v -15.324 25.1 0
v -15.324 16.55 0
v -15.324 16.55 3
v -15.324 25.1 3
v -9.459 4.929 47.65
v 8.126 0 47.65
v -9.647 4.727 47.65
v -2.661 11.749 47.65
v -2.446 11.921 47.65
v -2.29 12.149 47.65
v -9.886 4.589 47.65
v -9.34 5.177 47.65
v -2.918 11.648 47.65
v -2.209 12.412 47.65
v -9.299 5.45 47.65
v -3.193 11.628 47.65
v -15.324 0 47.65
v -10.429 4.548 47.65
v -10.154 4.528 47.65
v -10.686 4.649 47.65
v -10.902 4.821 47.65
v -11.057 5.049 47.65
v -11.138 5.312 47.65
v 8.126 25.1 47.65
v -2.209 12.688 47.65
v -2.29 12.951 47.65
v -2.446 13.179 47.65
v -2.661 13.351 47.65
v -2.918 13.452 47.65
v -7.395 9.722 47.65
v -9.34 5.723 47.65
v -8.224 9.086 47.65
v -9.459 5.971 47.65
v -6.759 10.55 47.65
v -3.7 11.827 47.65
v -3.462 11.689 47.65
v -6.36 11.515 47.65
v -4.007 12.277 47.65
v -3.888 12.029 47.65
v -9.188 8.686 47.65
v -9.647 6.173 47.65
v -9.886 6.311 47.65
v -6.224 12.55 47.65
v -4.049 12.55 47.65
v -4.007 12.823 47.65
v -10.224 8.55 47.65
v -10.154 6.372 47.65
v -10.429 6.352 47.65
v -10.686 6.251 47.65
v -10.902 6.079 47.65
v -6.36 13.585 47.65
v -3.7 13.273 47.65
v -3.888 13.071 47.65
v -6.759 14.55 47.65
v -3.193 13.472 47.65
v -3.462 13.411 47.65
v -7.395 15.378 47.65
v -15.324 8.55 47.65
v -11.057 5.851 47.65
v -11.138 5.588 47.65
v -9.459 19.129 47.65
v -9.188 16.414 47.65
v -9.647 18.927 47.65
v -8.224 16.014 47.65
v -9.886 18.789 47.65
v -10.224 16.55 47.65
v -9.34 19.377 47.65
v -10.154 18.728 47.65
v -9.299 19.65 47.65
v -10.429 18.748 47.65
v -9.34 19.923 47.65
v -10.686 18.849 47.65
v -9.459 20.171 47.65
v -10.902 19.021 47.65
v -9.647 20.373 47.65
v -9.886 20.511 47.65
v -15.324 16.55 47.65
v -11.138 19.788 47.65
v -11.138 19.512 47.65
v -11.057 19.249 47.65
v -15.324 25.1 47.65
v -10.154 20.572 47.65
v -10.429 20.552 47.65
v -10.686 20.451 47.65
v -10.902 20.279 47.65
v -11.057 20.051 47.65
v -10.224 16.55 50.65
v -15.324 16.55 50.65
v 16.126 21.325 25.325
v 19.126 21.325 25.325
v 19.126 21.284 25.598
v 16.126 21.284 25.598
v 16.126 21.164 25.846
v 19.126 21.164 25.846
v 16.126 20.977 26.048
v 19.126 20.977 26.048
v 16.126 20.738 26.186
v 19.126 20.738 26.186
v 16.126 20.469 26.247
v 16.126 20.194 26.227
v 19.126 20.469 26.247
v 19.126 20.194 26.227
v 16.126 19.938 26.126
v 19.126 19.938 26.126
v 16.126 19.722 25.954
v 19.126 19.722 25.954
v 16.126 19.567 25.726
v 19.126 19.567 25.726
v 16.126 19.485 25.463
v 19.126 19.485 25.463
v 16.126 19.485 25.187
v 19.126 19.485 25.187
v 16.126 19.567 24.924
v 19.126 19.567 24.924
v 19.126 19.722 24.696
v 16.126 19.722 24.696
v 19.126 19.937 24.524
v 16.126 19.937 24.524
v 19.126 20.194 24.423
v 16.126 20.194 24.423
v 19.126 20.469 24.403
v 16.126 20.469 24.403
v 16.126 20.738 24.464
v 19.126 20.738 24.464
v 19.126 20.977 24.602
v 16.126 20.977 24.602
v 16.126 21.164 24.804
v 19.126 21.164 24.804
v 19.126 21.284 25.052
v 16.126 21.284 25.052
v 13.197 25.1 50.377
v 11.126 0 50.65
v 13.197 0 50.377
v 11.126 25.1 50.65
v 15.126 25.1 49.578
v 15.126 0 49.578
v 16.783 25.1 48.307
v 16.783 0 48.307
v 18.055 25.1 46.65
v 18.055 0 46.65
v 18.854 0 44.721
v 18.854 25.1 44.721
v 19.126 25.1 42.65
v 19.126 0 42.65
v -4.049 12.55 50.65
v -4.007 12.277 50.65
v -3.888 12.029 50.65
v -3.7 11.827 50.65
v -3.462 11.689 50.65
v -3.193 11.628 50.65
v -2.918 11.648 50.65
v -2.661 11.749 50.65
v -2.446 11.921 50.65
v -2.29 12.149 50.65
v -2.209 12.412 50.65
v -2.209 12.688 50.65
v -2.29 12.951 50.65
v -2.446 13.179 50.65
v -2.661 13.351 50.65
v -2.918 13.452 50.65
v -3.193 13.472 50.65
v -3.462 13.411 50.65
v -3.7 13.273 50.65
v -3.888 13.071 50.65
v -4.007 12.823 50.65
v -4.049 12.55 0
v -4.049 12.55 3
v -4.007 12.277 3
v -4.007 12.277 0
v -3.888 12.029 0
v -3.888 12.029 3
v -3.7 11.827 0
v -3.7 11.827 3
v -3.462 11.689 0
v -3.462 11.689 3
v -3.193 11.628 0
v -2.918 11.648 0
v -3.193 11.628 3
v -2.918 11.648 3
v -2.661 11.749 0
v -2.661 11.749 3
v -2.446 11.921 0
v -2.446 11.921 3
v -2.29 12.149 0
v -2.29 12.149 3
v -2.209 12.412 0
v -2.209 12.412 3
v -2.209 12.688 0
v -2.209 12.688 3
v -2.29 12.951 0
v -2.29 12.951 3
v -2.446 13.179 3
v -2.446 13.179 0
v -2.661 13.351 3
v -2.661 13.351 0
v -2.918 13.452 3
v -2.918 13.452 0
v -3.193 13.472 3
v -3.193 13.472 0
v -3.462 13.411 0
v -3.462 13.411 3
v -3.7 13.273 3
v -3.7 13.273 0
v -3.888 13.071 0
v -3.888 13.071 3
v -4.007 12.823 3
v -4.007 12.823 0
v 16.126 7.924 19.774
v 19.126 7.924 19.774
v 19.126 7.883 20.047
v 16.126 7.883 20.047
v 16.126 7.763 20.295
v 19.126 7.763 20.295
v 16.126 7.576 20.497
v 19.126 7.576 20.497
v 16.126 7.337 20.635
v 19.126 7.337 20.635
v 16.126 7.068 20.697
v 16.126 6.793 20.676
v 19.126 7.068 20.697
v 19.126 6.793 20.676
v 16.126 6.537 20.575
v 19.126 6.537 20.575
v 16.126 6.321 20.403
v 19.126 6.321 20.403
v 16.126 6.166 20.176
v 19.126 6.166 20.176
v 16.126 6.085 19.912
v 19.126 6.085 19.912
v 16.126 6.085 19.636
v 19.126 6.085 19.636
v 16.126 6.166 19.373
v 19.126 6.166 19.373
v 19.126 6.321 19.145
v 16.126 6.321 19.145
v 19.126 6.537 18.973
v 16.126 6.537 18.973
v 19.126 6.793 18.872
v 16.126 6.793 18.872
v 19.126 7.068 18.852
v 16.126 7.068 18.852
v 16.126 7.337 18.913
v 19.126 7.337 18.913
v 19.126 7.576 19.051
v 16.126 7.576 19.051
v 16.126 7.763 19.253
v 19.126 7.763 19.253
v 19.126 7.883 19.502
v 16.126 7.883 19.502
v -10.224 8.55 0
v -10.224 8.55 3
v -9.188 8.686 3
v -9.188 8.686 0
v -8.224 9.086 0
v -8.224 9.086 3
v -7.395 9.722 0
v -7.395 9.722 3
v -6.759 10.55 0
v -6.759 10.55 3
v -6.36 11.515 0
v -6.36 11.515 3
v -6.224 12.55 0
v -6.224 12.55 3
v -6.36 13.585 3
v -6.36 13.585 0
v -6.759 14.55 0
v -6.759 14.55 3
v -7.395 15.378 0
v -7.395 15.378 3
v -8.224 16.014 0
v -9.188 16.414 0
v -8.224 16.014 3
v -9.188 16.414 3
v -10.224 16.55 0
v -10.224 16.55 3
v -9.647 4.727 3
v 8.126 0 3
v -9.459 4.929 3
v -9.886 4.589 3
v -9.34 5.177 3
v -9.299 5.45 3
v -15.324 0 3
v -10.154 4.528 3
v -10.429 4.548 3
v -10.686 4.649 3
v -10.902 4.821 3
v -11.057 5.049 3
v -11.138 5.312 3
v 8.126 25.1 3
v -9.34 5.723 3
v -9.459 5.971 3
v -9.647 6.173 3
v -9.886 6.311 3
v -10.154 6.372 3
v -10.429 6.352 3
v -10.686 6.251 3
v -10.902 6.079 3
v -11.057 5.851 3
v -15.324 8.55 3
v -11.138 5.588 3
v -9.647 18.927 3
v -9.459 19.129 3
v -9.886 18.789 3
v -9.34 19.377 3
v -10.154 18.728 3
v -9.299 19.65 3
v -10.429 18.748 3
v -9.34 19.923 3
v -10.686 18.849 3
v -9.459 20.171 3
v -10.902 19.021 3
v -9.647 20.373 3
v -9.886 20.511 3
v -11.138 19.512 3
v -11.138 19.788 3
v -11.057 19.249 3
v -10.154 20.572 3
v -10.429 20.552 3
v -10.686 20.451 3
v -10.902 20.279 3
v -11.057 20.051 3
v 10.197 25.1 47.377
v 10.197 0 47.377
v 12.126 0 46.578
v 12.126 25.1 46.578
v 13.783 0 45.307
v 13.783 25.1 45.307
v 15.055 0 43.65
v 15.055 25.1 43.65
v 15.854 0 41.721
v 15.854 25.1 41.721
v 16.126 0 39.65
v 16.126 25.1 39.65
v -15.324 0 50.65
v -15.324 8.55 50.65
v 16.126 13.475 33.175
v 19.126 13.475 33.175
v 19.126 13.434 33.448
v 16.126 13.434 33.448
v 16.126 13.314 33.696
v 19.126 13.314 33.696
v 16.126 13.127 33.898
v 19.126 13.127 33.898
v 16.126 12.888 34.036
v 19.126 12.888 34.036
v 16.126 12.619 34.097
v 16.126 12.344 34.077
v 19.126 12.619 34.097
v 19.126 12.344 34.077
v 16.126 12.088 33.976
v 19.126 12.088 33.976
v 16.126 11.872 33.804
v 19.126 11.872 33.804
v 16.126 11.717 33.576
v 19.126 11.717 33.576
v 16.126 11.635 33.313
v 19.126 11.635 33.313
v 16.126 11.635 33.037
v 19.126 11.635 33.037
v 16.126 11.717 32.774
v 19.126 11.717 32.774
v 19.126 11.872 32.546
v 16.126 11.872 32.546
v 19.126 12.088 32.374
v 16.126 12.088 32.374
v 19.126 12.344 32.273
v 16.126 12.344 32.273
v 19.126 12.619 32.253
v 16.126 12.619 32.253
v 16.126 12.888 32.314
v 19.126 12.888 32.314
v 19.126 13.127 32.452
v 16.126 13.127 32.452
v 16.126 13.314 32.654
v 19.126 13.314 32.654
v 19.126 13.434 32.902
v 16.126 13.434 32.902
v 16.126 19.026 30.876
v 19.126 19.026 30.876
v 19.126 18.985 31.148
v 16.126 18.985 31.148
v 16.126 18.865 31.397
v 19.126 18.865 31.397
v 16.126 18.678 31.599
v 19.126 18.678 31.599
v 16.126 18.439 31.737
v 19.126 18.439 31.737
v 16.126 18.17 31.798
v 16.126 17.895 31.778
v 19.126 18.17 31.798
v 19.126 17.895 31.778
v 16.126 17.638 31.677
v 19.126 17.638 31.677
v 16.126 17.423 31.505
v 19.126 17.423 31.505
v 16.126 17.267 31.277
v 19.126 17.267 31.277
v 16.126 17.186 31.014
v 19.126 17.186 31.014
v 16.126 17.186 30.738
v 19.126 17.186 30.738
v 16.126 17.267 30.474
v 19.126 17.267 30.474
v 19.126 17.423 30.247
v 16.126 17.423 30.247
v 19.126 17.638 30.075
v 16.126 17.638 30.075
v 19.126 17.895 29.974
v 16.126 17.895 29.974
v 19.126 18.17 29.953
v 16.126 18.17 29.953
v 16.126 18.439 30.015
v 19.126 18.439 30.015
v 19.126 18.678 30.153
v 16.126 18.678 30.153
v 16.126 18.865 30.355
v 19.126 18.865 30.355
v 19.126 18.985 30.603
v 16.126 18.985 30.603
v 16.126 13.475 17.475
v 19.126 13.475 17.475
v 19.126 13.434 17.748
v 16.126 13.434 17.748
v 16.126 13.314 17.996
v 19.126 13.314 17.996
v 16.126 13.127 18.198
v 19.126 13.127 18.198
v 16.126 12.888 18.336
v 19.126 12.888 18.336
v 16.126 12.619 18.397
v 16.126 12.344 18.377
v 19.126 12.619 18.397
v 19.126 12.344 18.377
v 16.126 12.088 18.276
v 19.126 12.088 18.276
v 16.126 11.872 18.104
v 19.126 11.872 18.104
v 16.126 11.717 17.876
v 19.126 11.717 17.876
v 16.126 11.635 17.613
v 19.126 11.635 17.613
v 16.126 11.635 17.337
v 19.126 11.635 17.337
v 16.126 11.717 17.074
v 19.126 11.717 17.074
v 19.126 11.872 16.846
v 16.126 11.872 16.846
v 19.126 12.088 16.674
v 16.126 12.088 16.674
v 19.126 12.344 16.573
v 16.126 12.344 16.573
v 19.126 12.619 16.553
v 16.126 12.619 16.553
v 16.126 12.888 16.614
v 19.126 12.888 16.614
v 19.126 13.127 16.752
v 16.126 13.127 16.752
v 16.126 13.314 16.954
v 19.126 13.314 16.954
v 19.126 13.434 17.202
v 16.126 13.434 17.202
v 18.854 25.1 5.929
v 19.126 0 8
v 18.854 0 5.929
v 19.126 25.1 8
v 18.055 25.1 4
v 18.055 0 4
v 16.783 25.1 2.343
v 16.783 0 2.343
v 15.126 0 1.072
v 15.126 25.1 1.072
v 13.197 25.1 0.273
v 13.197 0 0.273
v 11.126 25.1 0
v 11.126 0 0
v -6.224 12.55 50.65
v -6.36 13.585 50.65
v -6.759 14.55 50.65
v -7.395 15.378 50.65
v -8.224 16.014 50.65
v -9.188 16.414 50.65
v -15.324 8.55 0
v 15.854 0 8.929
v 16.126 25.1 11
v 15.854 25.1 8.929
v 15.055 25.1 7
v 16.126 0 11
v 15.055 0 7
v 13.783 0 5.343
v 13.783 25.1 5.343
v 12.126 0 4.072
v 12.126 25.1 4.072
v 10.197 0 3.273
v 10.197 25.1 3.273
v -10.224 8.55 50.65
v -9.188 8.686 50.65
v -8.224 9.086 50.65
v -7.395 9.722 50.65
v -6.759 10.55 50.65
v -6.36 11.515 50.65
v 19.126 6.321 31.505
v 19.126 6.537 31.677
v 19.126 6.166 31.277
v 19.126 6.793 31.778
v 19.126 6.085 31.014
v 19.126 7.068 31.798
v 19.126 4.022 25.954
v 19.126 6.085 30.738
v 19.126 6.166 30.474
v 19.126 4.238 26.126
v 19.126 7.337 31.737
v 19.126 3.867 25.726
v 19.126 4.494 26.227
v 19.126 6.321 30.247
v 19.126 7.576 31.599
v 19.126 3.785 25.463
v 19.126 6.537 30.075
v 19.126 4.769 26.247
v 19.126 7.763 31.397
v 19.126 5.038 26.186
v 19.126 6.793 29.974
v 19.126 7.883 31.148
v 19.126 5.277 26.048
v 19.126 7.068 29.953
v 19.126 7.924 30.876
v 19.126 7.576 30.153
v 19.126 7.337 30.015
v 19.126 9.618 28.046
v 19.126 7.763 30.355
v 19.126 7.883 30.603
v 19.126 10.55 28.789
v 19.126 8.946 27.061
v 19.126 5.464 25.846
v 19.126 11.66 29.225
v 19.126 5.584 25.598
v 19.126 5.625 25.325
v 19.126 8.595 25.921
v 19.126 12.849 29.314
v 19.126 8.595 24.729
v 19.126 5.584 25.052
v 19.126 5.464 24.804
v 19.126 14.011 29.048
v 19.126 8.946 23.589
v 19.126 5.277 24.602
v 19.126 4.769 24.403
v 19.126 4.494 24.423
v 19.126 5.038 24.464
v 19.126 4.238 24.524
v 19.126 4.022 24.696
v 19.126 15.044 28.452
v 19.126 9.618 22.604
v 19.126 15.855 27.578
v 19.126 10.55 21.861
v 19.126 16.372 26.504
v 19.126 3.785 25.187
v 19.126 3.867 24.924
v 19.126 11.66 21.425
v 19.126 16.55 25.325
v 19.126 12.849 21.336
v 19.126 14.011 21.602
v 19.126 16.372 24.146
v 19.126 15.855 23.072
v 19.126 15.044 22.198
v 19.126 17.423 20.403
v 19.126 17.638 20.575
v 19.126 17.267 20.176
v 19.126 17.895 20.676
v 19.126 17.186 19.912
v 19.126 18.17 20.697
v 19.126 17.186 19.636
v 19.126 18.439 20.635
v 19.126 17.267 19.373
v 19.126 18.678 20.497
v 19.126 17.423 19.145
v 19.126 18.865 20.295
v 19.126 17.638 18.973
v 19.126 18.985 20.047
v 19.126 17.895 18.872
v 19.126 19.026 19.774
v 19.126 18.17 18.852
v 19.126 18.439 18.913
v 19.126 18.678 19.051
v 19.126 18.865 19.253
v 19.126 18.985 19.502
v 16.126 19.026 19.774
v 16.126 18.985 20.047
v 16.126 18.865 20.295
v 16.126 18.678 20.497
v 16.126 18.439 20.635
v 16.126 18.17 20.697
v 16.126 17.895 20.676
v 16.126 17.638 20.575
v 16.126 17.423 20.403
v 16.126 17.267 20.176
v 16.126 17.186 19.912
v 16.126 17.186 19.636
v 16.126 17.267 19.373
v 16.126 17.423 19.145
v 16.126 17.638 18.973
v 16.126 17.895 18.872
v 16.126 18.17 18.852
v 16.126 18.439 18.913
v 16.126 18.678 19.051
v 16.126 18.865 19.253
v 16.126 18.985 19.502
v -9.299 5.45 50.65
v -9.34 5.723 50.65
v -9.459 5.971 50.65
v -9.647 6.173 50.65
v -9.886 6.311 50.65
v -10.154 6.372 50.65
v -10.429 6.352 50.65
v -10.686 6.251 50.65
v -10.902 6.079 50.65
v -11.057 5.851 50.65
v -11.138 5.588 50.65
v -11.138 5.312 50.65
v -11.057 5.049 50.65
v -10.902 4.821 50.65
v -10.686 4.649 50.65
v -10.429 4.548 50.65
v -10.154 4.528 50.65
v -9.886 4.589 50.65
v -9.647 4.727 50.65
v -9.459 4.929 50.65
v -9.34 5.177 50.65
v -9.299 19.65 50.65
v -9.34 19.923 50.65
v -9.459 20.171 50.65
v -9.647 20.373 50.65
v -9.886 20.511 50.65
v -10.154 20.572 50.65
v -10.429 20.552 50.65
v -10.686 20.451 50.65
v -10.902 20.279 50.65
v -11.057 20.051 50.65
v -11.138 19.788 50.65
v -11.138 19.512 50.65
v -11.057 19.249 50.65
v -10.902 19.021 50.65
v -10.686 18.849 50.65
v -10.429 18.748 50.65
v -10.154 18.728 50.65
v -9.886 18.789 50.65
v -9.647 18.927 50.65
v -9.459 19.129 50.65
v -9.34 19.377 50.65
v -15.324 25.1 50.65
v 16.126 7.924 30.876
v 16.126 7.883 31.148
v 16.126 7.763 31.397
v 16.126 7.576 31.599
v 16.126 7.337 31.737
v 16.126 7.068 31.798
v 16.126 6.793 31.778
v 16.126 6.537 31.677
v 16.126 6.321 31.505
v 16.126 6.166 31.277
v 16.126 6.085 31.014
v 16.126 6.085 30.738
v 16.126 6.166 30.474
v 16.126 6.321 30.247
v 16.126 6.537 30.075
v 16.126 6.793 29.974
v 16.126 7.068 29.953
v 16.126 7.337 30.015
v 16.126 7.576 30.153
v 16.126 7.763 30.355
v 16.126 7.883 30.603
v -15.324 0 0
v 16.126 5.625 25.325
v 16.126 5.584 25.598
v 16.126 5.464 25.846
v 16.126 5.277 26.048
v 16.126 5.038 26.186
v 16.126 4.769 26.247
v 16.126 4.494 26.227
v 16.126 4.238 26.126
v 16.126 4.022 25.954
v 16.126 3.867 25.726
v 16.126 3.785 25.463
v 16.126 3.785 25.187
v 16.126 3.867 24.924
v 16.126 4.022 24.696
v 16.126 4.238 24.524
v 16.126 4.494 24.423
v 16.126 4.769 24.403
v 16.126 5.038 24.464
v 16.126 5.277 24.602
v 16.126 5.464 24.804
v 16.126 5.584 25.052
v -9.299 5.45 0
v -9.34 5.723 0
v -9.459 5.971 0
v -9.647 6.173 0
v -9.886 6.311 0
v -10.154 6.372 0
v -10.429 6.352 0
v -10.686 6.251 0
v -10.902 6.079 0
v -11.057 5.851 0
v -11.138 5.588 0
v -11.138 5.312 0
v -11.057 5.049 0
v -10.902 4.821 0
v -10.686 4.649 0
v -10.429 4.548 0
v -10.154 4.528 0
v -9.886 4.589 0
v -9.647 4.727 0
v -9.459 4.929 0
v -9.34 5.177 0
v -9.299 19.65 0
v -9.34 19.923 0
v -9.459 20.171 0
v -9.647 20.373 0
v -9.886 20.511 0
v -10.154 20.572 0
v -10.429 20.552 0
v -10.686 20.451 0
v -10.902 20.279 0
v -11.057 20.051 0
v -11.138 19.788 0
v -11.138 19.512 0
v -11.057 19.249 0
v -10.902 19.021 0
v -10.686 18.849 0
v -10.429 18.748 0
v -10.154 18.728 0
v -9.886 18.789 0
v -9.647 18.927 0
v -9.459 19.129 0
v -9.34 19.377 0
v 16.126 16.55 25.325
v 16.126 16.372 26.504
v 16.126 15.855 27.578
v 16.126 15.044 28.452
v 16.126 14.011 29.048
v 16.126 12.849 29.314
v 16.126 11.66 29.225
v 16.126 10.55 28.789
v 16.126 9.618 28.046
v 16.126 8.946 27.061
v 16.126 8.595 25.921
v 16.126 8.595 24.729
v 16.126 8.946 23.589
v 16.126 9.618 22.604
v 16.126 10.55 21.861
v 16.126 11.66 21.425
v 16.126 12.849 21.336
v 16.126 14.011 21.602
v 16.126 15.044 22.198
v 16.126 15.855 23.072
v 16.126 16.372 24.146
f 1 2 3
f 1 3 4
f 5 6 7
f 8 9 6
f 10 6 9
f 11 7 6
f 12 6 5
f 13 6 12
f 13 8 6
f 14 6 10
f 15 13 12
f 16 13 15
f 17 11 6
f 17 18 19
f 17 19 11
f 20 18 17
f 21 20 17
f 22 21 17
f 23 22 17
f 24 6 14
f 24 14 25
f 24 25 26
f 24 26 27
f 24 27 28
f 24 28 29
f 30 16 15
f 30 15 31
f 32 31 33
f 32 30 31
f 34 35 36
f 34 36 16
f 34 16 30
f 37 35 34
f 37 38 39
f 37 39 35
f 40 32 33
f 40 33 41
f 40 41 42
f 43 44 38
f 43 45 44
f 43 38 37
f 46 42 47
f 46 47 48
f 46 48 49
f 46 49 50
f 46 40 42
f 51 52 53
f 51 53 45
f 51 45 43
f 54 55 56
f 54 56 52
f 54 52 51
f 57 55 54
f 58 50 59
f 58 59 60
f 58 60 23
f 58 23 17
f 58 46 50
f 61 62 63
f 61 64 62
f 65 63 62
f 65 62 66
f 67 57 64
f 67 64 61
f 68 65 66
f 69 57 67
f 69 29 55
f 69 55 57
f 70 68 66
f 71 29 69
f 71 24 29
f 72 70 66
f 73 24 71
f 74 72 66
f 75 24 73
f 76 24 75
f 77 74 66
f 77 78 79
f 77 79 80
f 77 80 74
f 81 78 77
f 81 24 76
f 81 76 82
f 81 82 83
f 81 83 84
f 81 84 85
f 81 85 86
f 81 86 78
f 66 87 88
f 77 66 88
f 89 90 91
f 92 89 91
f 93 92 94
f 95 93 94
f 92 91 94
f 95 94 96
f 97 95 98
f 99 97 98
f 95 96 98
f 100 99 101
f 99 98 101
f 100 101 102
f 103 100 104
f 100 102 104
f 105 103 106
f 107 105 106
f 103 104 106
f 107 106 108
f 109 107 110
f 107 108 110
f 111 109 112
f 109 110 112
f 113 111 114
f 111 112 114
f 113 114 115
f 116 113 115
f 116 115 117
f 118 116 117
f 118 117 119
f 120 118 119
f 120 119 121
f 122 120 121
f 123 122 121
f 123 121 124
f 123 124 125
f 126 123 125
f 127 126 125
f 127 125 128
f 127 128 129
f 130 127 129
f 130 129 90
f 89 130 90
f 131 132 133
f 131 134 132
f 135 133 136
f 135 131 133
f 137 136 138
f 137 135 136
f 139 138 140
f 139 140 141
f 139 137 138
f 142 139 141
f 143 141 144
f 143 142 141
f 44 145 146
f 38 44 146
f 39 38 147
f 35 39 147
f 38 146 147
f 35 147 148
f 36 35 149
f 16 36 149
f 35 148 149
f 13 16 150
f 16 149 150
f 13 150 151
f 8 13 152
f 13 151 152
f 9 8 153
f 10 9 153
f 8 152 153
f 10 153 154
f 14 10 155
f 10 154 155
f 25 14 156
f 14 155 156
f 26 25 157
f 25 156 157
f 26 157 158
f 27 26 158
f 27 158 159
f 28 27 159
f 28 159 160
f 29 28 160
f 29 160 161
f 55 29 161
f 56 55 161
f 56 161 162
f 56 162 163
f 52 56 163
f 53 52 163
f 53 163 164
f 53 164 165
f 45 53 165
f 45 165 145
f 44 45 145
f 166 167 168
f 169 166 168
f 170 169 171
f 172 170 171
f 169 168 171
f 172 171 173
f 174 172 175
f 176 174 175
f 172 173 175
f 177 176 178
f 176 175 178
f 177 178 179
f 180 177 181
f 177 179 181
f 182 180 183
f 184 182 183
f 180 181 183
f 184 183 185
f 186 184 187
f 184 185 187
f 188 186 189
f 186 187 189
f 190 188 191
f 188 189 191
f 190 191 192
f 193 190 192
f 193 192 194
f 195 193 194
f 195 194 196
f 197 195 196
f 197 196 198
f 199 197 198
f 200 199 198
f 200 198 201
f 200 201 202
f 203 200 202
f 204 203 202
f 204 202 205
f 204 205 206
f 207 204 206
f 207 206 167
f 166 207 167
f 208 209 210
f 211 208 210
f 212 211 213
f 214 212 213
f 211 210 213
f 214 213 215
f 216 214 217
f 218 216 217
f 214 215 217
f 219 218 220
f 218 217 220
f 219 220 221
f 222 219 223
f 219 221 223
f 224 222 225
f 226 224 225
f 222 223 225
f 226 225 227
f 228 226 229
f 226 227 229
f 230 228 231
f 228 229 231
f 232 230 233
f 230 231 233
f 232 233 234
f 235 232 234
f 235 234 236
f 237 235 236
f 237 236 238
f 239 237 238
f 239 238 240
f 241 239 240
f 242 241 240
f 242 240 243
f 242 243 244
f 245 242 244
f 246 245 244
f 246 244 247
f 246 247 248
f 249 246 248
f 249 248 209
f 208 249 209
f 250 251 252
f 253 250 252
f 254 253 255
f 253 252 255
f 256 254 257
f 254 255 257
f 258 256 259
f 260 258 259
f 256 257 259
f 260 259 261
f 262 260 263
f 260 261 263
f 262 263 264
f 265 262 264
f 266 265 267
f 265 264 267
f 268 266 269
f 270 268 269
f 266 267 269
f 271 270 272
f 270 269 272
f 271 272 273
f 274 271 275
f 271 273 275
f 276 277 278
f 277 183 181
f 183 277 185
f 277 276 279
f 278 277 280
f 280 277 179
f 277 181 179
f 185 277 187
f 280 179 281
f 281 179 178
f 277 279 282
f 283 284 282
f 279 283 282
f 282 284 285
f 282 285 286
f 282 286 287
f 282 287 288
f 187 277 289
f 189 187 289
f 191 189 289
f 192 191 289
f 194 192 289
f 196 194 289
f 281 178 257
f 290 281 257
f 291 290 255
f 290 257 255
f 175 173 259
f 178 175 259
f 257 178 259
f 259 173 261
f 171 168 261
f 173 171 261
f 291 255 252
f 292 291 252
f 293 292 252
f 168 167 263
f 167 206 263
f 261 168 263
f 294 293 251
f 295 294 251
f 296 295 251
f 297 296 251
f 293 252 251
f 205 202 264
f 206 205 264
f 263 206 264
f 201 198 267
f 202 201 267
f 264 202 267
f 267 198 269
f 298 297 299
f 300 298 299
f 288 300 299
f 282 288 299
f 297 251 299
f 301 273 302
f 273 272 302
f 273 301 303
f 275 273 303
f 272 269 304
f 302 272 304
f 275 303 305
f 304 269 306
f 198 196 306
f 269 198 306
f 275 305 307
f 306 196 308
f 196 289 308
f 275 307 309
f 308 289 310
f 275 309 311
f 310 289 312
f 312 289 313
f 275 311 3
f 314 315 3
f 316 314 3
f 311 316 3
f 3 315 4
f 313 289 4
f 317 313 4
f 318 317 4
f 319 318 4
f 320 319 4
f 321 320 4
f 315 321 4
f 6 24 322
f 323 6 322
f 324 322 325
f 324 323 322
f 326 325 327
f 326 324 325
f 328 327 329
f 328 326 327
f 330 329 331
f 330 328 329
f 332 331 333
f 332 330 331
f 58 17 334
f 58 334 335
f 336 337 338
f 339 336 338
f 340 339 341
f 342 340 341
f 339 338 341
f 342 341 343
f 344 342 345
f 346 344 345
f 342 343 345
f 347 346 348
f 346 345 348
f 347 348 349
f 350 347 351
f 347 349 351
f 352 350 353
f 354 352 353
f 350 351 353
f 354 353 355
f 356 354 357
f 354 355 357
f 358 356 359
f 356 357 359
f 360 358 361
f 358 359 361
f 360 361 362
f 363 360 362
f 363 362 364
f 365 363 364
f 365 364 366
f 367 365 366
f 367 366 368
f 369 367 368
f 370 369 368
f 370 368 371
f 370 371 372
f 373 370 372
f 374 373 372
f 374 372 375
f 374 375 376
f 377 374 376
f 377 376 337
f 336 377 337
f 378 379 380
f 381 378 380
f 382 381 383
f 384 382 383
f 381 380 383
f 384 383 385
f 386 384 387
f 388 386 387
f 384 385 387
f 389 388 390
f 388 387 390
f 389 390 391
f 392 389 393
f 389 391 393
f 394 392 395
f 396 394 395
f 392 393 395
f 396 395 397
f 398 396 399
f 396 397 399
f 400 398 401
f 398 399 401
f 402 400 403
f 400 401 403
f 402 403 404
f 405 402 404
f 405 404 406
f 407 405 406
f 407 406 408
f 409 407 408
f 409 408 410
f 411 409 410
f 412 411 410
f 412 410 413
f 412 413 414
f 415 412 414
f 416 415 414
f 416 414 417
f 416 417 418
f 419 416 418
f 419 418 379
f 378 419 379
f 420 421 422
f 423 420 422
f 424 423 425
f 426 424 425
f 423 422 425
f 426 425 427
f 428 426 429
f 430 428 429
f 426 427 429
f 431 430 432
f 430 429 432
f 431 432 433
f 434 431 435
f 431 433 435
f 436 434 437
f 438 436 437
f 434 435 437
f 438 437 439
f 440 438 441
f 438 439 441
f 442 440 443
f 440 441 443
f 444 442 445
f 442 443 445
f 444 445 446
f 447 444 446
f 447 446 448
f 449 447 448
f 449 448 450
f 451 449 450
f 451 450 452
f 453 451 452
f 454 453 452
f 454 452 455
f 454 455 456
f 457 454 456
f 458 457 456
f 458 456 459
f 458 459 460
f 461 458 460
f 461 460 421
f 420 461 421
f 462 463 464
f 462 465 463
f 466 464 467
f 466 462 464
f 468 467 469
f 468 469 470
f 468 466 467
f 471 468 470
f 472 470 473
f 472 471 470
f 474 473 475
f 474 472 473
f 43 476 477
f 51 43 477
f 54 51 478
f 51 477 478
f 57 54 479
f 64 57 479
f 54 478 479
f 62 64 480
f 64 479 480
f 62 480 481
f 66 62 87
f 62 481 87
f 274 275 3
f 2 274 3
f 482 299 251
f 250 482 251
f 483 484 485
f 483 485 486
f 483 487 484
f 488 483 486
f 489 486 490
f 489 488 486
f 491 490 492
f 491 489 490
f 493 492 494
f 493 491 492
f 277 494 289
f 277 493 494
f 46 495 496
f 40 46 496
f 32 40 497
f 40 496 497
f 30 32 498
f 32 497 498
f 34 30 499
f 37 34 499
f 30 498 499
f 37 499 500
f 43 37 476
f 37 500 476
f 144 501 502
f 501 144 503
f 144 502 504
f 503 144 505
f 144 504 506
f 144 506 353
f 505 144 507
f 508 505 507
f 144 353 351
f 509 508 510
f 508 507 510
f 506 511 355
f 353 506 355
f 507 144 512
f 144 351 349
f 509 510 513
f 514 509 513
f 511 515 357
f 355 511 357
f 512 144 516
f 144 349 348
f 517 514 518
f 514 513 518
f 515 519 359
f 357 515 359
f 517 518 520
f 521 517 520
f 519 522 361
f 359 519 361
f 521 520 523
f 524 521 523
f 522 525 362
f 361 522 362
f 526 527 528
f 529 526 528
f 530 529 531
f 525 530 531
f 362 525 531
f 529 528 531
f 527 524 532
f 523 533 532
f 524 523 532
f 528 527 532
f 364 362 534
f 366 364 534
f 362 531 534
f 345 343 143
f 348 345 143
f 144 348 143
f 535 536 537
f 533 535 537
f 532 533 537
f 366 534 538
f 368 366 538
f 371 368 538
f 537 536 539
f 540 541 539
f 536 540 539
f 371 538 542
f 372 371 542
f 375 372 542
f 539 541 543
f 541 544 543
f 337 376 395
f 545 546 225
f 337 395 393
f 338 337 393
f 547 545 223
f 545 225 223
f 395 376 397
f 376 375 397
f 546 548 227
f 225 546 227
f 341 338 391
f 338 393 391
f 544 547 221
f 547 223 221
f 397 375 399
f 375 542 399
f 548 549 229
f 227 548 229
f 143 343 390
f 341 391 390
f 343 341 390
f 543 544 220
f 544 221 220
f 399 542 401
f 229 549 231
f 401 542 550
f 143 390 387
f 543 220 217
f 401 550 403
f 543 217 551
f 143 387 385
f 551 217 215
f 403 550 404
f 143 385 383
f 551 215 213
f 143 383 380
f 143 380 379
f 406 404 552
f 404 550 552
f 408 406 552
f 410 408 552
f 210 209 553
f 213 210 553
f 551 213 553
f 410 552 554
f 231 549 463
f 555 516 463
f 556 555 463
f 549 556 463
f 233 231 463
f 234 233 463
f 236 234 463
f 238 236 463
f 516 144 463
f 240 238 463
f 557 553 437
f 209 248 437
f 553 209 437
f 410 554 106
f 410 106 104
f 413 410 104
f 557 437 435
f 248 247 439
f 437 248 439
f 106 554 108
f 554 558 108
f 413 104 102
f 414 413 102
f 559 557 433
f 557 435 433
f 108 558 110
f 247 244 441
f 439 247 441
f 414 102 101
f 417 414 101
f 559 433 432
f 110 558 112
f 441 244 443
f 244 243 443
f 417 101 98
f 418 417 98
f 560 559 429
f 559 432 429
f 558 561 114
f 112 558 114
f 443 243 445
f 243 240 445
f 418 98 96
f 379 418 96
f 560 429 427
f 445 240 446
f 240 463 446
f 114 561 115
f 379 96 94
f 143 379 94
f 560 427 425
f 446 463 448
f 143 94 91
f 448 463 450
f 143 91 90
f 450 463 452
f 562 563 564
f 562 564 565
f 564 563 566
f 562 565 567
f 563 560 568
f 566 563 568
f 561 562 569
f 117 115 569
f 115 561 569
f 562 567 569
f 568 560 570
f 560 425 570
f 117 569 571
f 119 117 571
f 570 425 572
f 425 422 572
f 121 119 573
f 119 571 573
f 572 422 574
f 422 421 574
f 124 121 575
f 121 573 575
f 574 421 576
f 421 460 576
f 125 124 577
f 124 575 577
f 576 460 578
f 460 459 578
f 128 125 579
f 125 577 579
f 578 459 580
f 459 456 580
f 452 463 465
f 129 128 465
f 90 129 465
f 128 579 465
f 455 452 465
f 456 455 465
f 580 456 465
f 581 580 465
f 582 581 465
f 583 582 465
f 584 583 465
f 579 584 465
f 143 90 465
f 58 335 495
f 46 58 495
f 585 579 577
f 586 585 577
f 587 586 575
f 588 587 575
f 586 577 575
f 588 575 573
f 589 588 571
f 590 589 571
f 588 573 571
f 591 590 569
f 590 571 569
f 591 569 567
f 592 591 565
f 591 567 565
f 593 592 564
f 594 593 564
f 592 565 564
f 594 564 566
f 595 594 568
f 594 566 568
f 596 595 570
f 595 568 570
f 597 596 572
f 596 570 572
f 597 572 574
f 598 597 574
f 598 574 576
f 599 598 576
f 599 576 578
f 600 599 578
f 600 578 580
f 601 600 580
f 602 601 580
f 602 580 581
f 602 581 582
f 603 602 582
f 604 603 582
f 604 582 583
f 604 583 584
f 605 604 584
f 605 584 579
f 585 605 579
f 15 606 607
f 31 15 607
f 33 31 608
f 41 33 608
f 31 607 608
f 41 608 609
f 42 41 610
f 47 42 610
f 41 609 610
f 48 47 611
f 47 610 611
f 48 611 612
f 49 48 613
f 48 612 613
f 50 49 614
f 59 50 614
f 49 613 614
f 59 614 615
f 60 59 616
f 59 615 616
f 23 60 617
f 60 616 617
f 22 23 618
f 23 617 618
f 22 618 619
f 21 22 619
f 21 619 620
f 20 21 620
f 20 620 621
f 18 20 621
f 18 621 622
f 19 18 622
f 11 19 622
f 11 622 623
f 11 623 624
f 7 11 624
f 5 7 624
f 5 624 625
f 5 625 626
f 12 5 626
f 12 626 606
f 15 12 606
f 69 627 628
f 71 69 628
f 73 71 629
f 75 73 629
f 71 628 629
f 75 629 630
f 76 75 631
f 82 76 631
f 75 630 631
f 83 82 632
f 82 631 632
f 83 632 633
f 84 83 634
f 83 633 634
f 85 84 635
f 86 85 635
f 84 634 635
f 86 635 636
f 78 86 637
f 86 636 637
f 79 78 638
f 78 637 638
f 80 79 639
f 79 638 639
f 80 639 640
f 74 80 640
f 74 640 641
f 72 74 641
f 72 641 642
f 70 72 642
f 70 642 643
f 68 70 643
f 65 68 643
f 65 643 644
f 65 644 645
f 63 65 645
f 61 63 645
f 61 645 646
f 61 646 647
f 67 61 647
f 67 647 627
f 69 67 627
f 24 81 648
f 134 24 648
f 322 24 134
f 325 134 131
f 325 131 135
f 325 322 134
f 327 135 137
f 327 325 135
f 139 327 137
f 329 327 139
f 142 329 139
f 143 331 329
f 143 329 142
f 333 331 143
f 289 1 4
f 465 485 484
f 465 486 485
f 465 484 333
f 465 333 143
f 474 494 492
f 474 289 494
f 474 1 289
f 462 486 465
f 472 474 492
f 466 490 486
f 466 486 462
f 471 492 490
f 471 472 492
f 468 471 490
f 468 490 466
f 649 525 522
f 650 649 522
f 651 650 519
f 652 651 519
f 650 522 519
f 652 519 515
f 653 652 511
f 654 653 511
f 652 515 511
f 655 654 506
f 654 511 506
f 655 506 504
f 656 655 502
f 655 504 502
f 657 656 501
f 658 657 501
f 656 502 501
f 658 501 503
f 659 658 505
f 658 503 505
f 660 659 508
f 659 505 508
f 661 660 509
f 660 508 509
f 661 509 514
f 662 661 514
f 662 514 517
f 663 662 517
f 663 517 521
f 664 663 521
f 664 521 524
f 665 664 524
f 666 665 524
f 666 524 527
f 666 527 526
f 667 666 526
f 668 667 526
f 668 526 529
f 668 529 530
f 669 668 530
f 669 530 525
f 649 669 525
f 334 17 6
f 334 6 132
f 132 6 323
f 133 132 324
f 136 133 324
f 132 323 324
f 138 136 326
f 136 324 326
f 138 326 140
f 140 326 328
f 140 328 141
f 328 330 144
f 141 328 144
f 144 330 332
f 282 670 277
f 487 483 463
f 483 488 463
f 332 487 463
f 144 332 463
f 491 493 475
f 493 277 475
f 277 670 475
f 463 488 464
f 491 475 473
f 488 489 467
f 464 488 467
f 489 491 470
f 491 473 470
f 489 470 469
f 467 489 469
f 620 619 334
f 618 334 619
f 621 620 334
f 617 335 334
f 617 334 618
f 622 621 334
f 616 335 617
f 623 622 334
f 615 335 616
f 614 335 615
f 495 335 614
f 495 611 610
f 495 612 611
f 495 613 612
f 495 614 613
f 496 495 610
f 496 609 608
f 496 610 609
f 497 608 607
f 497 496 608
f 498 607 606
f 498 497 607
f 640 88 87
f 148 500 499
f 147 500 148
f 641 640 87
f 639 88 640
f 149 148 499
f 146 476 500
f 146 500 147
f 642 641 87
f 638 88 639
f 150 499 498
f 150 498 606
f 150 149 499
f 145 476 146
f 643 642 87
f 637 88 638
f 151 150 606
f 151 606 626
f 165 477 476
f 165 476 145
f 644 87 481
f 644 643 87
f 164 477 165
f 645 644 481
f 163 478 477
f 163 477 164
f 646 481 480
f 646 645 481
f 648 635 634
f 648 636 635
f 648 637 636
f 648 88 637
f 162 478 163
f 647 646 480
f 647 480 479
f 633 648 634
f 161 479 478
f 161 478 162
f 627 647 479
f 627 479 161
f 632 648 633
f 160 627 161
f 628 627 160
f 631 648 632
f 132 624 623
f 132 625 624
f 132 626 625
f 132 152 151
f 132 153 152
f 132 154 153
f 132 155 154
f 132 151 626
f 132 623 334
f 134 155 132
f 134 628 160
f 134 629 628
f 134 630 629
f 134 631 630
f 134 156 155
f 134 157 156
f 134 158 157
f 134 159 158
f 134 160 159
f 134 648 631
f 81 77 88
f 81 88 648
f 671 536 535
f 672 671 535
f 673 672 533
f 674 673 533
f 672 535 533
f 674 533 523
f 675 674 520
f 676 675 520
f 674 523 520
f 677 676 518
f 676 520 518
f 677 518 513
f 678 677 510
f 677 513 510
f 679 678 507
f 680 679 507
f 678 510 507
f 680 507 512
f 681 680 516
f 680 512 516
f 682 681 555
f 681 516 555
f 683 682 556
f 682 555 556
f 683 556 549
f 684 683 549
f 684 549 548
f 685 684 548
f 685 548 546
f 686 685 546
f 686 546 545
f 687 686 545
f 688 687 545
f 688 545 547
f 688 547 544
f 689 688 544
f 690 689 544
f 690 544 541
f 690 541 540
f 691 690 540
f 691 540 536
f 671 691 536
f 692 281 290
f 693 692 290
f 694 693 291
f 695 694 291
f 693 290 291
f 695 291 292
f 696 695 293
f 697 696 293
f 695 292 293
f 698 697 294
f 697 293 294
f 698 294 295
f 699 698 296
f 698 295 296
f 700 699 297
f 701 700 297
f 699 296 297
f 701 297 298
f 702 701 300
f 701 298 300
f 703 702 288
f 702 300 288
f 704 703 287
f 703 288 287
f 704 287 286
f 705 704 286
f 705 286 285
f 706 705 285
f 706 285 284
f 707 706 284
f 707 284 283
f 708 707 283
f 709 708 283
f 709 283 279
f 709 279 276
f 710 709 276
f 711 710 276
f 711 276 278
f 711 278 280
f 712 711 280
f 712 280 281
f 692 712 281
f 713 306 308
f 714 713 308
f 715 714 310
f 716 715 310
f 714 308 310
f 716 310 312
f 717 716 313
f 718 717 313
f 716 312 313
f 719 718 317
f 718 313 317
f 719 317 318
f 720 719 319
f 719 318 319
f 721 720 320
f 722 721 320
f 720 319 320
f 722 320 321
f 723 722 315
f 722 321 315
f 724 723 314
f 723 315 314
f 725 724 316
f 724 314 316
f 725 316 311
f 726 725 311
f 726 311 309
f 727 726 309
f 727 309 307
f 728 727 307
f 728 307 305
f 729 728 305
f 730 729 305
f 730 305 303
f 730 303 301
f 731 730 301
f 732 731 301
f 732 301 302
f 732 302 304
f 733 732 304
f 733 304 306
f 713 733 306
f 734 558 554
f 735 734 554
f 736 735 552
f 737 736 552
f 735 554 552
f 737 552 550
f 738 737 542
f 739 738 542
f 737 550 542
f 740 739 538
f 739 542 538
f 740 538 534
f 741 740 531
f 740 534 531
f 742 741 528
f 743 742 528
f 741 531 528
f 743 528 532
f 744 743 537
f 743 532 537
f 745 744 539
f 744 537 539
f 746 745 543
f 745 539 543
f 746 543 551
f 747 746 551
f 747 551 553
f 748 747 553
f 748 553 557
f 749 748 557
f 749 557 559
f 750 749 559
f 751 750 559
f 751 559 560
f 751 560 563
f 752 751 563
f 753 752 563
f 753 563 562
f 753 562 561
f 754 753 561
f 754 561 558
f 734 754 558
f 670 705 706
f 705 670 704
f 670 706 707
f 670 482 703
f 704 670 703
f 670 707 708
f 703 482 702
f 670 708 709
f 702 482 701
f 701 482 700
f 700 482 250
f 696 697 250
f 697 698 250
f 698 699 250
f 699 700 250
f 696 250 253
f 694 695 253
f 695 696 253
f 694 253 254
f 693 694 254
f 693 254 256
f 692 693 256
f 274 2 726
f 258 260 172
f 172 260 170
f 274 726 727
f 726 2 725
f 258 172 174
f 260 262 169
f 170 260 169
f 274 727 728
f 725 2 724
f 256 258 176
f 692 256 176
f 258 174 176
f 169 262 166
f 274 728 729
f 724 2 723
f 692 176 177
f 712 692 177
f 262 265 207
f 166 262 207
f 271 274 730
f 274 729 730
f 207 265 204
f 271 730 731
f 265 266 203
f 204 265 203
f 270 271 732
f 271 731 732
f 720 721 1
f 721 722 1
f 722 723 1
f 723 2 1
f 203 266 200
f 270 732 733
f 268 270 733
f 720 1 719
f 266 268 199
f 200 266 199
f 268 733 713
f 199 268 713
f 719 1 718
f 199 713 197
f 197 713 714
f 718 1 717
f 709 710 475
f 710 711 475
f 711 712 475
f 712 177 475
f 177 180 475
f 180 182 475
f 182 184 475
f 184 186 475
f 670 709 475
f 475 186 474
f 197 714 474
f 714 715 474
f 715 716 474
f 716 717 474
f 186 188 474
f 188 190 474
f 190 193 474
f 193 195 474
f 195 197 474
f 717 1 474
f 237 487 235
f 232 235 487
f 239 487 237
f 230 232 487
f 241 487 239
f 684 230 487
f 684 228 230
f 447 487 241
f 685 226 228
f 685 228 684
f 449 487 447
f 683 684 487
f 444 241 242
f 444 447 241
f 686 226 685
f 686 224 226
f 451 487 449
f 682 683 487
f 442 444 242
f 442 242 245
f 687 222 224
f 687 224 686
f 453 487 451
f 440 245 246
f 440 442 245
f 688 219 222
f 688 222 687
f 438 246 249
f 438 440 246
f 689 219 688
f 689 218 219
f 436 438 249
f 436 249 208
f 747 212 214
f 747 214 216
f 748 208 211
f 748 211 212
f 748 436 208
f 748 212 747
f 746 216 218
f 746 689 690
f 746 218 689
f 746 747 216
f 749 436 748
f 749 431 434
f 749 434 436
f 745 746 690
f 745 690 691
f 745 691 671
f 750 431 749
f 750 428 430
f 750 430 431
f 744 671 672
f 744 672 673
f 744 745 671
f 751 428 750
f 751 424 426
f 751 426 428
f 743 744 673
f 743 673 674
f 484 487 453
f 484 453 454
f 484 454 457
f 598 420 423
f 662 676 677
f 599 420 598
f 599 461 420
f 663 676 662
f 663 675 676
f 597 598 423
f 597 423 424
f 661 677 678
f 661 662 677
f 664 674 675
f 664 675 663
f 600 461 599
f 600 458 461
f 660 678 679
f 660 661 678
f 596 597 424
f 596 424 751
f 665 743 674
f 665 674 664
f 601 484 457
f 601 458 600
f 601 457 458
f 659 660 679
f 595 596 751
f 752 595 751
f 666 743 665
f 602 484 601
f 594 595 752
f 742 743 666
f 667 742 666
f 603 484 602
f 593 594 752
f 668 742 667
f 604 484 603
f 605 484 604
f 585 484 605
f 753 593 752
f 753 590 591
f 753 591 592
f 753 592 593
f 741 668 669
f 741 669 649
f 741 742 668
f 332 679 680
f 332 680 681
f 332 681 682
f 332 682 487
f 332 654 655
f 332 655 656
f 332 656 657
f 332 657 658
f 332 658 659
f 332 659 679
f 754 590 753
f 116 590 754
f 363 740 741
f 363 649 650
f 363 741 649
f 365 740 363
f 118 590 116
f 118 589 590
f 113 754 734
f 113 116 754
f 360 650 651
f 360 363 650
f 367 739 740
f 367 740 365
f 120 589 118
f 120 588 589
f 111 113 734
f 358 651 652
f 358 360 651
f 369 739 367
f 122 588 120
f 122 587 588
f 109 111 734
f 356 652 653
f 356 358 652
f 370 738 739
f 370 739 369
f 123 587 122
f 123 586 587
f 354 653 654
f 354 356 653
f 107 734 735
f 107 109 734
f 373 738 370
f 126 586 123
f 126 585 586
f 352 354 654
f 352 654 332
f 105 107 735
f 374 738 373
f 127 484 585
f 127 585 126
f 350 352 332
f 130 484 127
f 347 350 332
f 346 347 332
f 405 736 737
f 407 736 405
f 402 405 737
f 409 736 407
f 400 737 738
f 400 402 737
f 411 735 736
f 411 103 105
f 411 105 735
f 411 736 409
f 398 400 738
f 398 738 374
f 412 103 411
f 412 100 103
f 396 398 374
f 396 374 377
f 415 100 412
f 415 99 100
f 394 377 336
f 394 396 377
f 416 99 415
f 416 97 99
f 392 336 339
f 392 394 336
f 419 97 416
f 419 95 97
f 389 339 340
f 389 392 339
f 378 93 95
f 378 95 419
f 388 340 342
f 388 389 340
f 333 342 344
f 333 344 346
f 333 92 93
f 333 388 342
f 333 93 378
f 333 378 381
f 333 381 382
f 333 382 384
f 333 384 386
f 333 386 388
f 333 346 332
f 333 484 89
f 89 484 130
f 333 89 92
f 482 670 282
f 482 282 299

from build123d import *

# Parameters (mm, degrees)
F0_W      = 34.45
F0_H      = 25.1
F1_DEPTH  = 50.65
F2_T      = -5
F3_R      = 4
F3_R_2    = 0.925
F4_DEPTH  = 25
F5_W      = 31.45
F5_H      = 44.65
F6_DEPTH  = 25.101
F7_R      = 8
F8_R      = 8
F9_R      = 0.925
F10_DEPTH = 50.651


with BuildPart() as f1:
    # F0 (on Top) → F1 (new body)
    with BuildSketch(Plane.XY):
        with Locations((1.9014209259, 12.55)):
            Rectangle(F0_W, F0_H)
    extrude(amount=F1_DEPTH)

    # F2
    f2_openings = [f1.faces().sort_by_distance(p)[0] for p in [
        (-15.323579, 12.55, 25.325),
    ]]
    offset(amount=F2_T, openings=f2_openings)

    # F3 (on face) → F4 (cut)
    with BuildSketch(Plane.YZ.offset(19.1264209259)):
        with Locations((12.55, 25.325)):
            Circle(F3_R)
        with Locations((12.55, 17.475)):
            Circle(F3_R_2)
        with Locations((18.1007882323, 19.7742117677)):
            Circle(F3_R_2)
        with Locations((20.4, 25.325)):
            Circle(F3_R_2)
        with Locations((18.1007882323, 30.8757882323)):
            Circle(F3_R_2)
        with Locations((12.55, 33.175)):
            Circle(F3_R_2)
        with Locations((6.9992117677, 30.8757882323)):
            Circle(F3_R_2)
        with Locations((4.7, 25.325)):
            Circle(F3_R_2)
        with Locations((6.9992117677, 19.7742117677)):
            Circle(F3_R_2)
    extrude(amount=-F4_DEPTH, mode=Mode.SUBTRACT)

    # F5 (on face) → F6 (cut, through all)
    with BuildSketch(Plane(origin=(0, 25.1, 0), x_dir=(-1, 0, 0), z_dir=(0, 1, 0))):
        with Locations((-0.4014209259, 25.325)):
            Rectangle(F5_W, F5_H)
    extrude(amount=-F6_DEPTH, mode=Mode.SUBTRACT)

    # F7
    f7_edges = [f1.edges().sort_by_distance(p)[0] for p in [
        (16.126421, 12.55, 47.65),
        (16.126421, 12.55, 3),
    ]]
    fillet(f7_edges, radius=F7_R)

    # F8
    f8_edges = [f1.edges().sort_by_distance(p)[0] for p in [
        (19.126421, 12.55, 50.65),
        (19.126421, 12.55, 0),
    ]]
    fillet(f8_edges, radius=F8_R)

    # F9 (on face) → F10 (cut, through all)
    with BuildSketch(Plane.XY.offset(50.65)):
        with Locations((-10.2235790741, 19.65)):
            Circle(F9_R)
        with Locations((-10.2235790741, 5.45)):
            Circle(F9_R)
        with BuildLine():
            Line((-4.0485790741, 12.55), (-2.1985790741, 12.55))
            ThreePointArc((-2.1985790741, 12.55), (-3.1235790741, 13.475), (-4.0485790741, 12.55))
        make_face()
        with BuildLine():
            ThreePointArc((-4.0485790741, 12.55), (-3.1235790741, 11.625), (-2.1985790741, 12.55))
            Line((-2.1985790741, 12.55), (-4.0485790741, 12.55))
        make_face()
        with BuildLine():
            ThreePointArc((-10.2235790741, 16.55), (-13.0520061988, 15.3784271247), (-14.2235790741, 12.55))
            Line((-14.2235790741, 12.55), (-6.2235790741, 12.55))
            ThreePointArc((-6.2235790741, 12.55), (-7.3951519493, 15.3784271247), (-10.2235790741, 16.55))
        make_face()
        with BuildLine():
            ThreePointArc((-14.2235790741, 12.55), (-13.0520061988, 9.7215728753), (-10.2235790741, 8.55))
            ThreePointArc((-10.2235790741, 8.55), (-7.3951519493, 9.7215728753), (-6.2235790741, 12.55))
            Line((-6.2235790741, 12.55), (-14.2235790741, 12.55))
        make_face()
        with BuildLine():
            Line((-15.3235790741, 16.55), (-15.3235790741, 12.55))
            Line((-15.3235790741, 12.55), (-14.2235790741, 12.55))
            ThreePointArc((-14.2235790741, 12.55), (-13.0520061988, 15.3784271247), (-10.2235790741, 16.55))
            Line((-10.2235790741, 16.55), (-15.3235790741, 16.55))
        make_face()
        with BuildLine():
            Line((-15.3235790741, 12.55), (-15.3235790741, 8.55))
            Line((-15.3235790741, 8.55), (-10.2235790741, 8.55))
            ThreePointArc((-10.2235790741, 8.55), (-13.0520061988, 9.7215728753), (-14.2235790741, 12.55))
            Line((-14.2235790741, 12.55), (-15.3235790741, 12.55))
        make_face()
    extrude(amount=-F10_DEPTH, mode=Mode.SUBTRACT)


solid = f1.part
